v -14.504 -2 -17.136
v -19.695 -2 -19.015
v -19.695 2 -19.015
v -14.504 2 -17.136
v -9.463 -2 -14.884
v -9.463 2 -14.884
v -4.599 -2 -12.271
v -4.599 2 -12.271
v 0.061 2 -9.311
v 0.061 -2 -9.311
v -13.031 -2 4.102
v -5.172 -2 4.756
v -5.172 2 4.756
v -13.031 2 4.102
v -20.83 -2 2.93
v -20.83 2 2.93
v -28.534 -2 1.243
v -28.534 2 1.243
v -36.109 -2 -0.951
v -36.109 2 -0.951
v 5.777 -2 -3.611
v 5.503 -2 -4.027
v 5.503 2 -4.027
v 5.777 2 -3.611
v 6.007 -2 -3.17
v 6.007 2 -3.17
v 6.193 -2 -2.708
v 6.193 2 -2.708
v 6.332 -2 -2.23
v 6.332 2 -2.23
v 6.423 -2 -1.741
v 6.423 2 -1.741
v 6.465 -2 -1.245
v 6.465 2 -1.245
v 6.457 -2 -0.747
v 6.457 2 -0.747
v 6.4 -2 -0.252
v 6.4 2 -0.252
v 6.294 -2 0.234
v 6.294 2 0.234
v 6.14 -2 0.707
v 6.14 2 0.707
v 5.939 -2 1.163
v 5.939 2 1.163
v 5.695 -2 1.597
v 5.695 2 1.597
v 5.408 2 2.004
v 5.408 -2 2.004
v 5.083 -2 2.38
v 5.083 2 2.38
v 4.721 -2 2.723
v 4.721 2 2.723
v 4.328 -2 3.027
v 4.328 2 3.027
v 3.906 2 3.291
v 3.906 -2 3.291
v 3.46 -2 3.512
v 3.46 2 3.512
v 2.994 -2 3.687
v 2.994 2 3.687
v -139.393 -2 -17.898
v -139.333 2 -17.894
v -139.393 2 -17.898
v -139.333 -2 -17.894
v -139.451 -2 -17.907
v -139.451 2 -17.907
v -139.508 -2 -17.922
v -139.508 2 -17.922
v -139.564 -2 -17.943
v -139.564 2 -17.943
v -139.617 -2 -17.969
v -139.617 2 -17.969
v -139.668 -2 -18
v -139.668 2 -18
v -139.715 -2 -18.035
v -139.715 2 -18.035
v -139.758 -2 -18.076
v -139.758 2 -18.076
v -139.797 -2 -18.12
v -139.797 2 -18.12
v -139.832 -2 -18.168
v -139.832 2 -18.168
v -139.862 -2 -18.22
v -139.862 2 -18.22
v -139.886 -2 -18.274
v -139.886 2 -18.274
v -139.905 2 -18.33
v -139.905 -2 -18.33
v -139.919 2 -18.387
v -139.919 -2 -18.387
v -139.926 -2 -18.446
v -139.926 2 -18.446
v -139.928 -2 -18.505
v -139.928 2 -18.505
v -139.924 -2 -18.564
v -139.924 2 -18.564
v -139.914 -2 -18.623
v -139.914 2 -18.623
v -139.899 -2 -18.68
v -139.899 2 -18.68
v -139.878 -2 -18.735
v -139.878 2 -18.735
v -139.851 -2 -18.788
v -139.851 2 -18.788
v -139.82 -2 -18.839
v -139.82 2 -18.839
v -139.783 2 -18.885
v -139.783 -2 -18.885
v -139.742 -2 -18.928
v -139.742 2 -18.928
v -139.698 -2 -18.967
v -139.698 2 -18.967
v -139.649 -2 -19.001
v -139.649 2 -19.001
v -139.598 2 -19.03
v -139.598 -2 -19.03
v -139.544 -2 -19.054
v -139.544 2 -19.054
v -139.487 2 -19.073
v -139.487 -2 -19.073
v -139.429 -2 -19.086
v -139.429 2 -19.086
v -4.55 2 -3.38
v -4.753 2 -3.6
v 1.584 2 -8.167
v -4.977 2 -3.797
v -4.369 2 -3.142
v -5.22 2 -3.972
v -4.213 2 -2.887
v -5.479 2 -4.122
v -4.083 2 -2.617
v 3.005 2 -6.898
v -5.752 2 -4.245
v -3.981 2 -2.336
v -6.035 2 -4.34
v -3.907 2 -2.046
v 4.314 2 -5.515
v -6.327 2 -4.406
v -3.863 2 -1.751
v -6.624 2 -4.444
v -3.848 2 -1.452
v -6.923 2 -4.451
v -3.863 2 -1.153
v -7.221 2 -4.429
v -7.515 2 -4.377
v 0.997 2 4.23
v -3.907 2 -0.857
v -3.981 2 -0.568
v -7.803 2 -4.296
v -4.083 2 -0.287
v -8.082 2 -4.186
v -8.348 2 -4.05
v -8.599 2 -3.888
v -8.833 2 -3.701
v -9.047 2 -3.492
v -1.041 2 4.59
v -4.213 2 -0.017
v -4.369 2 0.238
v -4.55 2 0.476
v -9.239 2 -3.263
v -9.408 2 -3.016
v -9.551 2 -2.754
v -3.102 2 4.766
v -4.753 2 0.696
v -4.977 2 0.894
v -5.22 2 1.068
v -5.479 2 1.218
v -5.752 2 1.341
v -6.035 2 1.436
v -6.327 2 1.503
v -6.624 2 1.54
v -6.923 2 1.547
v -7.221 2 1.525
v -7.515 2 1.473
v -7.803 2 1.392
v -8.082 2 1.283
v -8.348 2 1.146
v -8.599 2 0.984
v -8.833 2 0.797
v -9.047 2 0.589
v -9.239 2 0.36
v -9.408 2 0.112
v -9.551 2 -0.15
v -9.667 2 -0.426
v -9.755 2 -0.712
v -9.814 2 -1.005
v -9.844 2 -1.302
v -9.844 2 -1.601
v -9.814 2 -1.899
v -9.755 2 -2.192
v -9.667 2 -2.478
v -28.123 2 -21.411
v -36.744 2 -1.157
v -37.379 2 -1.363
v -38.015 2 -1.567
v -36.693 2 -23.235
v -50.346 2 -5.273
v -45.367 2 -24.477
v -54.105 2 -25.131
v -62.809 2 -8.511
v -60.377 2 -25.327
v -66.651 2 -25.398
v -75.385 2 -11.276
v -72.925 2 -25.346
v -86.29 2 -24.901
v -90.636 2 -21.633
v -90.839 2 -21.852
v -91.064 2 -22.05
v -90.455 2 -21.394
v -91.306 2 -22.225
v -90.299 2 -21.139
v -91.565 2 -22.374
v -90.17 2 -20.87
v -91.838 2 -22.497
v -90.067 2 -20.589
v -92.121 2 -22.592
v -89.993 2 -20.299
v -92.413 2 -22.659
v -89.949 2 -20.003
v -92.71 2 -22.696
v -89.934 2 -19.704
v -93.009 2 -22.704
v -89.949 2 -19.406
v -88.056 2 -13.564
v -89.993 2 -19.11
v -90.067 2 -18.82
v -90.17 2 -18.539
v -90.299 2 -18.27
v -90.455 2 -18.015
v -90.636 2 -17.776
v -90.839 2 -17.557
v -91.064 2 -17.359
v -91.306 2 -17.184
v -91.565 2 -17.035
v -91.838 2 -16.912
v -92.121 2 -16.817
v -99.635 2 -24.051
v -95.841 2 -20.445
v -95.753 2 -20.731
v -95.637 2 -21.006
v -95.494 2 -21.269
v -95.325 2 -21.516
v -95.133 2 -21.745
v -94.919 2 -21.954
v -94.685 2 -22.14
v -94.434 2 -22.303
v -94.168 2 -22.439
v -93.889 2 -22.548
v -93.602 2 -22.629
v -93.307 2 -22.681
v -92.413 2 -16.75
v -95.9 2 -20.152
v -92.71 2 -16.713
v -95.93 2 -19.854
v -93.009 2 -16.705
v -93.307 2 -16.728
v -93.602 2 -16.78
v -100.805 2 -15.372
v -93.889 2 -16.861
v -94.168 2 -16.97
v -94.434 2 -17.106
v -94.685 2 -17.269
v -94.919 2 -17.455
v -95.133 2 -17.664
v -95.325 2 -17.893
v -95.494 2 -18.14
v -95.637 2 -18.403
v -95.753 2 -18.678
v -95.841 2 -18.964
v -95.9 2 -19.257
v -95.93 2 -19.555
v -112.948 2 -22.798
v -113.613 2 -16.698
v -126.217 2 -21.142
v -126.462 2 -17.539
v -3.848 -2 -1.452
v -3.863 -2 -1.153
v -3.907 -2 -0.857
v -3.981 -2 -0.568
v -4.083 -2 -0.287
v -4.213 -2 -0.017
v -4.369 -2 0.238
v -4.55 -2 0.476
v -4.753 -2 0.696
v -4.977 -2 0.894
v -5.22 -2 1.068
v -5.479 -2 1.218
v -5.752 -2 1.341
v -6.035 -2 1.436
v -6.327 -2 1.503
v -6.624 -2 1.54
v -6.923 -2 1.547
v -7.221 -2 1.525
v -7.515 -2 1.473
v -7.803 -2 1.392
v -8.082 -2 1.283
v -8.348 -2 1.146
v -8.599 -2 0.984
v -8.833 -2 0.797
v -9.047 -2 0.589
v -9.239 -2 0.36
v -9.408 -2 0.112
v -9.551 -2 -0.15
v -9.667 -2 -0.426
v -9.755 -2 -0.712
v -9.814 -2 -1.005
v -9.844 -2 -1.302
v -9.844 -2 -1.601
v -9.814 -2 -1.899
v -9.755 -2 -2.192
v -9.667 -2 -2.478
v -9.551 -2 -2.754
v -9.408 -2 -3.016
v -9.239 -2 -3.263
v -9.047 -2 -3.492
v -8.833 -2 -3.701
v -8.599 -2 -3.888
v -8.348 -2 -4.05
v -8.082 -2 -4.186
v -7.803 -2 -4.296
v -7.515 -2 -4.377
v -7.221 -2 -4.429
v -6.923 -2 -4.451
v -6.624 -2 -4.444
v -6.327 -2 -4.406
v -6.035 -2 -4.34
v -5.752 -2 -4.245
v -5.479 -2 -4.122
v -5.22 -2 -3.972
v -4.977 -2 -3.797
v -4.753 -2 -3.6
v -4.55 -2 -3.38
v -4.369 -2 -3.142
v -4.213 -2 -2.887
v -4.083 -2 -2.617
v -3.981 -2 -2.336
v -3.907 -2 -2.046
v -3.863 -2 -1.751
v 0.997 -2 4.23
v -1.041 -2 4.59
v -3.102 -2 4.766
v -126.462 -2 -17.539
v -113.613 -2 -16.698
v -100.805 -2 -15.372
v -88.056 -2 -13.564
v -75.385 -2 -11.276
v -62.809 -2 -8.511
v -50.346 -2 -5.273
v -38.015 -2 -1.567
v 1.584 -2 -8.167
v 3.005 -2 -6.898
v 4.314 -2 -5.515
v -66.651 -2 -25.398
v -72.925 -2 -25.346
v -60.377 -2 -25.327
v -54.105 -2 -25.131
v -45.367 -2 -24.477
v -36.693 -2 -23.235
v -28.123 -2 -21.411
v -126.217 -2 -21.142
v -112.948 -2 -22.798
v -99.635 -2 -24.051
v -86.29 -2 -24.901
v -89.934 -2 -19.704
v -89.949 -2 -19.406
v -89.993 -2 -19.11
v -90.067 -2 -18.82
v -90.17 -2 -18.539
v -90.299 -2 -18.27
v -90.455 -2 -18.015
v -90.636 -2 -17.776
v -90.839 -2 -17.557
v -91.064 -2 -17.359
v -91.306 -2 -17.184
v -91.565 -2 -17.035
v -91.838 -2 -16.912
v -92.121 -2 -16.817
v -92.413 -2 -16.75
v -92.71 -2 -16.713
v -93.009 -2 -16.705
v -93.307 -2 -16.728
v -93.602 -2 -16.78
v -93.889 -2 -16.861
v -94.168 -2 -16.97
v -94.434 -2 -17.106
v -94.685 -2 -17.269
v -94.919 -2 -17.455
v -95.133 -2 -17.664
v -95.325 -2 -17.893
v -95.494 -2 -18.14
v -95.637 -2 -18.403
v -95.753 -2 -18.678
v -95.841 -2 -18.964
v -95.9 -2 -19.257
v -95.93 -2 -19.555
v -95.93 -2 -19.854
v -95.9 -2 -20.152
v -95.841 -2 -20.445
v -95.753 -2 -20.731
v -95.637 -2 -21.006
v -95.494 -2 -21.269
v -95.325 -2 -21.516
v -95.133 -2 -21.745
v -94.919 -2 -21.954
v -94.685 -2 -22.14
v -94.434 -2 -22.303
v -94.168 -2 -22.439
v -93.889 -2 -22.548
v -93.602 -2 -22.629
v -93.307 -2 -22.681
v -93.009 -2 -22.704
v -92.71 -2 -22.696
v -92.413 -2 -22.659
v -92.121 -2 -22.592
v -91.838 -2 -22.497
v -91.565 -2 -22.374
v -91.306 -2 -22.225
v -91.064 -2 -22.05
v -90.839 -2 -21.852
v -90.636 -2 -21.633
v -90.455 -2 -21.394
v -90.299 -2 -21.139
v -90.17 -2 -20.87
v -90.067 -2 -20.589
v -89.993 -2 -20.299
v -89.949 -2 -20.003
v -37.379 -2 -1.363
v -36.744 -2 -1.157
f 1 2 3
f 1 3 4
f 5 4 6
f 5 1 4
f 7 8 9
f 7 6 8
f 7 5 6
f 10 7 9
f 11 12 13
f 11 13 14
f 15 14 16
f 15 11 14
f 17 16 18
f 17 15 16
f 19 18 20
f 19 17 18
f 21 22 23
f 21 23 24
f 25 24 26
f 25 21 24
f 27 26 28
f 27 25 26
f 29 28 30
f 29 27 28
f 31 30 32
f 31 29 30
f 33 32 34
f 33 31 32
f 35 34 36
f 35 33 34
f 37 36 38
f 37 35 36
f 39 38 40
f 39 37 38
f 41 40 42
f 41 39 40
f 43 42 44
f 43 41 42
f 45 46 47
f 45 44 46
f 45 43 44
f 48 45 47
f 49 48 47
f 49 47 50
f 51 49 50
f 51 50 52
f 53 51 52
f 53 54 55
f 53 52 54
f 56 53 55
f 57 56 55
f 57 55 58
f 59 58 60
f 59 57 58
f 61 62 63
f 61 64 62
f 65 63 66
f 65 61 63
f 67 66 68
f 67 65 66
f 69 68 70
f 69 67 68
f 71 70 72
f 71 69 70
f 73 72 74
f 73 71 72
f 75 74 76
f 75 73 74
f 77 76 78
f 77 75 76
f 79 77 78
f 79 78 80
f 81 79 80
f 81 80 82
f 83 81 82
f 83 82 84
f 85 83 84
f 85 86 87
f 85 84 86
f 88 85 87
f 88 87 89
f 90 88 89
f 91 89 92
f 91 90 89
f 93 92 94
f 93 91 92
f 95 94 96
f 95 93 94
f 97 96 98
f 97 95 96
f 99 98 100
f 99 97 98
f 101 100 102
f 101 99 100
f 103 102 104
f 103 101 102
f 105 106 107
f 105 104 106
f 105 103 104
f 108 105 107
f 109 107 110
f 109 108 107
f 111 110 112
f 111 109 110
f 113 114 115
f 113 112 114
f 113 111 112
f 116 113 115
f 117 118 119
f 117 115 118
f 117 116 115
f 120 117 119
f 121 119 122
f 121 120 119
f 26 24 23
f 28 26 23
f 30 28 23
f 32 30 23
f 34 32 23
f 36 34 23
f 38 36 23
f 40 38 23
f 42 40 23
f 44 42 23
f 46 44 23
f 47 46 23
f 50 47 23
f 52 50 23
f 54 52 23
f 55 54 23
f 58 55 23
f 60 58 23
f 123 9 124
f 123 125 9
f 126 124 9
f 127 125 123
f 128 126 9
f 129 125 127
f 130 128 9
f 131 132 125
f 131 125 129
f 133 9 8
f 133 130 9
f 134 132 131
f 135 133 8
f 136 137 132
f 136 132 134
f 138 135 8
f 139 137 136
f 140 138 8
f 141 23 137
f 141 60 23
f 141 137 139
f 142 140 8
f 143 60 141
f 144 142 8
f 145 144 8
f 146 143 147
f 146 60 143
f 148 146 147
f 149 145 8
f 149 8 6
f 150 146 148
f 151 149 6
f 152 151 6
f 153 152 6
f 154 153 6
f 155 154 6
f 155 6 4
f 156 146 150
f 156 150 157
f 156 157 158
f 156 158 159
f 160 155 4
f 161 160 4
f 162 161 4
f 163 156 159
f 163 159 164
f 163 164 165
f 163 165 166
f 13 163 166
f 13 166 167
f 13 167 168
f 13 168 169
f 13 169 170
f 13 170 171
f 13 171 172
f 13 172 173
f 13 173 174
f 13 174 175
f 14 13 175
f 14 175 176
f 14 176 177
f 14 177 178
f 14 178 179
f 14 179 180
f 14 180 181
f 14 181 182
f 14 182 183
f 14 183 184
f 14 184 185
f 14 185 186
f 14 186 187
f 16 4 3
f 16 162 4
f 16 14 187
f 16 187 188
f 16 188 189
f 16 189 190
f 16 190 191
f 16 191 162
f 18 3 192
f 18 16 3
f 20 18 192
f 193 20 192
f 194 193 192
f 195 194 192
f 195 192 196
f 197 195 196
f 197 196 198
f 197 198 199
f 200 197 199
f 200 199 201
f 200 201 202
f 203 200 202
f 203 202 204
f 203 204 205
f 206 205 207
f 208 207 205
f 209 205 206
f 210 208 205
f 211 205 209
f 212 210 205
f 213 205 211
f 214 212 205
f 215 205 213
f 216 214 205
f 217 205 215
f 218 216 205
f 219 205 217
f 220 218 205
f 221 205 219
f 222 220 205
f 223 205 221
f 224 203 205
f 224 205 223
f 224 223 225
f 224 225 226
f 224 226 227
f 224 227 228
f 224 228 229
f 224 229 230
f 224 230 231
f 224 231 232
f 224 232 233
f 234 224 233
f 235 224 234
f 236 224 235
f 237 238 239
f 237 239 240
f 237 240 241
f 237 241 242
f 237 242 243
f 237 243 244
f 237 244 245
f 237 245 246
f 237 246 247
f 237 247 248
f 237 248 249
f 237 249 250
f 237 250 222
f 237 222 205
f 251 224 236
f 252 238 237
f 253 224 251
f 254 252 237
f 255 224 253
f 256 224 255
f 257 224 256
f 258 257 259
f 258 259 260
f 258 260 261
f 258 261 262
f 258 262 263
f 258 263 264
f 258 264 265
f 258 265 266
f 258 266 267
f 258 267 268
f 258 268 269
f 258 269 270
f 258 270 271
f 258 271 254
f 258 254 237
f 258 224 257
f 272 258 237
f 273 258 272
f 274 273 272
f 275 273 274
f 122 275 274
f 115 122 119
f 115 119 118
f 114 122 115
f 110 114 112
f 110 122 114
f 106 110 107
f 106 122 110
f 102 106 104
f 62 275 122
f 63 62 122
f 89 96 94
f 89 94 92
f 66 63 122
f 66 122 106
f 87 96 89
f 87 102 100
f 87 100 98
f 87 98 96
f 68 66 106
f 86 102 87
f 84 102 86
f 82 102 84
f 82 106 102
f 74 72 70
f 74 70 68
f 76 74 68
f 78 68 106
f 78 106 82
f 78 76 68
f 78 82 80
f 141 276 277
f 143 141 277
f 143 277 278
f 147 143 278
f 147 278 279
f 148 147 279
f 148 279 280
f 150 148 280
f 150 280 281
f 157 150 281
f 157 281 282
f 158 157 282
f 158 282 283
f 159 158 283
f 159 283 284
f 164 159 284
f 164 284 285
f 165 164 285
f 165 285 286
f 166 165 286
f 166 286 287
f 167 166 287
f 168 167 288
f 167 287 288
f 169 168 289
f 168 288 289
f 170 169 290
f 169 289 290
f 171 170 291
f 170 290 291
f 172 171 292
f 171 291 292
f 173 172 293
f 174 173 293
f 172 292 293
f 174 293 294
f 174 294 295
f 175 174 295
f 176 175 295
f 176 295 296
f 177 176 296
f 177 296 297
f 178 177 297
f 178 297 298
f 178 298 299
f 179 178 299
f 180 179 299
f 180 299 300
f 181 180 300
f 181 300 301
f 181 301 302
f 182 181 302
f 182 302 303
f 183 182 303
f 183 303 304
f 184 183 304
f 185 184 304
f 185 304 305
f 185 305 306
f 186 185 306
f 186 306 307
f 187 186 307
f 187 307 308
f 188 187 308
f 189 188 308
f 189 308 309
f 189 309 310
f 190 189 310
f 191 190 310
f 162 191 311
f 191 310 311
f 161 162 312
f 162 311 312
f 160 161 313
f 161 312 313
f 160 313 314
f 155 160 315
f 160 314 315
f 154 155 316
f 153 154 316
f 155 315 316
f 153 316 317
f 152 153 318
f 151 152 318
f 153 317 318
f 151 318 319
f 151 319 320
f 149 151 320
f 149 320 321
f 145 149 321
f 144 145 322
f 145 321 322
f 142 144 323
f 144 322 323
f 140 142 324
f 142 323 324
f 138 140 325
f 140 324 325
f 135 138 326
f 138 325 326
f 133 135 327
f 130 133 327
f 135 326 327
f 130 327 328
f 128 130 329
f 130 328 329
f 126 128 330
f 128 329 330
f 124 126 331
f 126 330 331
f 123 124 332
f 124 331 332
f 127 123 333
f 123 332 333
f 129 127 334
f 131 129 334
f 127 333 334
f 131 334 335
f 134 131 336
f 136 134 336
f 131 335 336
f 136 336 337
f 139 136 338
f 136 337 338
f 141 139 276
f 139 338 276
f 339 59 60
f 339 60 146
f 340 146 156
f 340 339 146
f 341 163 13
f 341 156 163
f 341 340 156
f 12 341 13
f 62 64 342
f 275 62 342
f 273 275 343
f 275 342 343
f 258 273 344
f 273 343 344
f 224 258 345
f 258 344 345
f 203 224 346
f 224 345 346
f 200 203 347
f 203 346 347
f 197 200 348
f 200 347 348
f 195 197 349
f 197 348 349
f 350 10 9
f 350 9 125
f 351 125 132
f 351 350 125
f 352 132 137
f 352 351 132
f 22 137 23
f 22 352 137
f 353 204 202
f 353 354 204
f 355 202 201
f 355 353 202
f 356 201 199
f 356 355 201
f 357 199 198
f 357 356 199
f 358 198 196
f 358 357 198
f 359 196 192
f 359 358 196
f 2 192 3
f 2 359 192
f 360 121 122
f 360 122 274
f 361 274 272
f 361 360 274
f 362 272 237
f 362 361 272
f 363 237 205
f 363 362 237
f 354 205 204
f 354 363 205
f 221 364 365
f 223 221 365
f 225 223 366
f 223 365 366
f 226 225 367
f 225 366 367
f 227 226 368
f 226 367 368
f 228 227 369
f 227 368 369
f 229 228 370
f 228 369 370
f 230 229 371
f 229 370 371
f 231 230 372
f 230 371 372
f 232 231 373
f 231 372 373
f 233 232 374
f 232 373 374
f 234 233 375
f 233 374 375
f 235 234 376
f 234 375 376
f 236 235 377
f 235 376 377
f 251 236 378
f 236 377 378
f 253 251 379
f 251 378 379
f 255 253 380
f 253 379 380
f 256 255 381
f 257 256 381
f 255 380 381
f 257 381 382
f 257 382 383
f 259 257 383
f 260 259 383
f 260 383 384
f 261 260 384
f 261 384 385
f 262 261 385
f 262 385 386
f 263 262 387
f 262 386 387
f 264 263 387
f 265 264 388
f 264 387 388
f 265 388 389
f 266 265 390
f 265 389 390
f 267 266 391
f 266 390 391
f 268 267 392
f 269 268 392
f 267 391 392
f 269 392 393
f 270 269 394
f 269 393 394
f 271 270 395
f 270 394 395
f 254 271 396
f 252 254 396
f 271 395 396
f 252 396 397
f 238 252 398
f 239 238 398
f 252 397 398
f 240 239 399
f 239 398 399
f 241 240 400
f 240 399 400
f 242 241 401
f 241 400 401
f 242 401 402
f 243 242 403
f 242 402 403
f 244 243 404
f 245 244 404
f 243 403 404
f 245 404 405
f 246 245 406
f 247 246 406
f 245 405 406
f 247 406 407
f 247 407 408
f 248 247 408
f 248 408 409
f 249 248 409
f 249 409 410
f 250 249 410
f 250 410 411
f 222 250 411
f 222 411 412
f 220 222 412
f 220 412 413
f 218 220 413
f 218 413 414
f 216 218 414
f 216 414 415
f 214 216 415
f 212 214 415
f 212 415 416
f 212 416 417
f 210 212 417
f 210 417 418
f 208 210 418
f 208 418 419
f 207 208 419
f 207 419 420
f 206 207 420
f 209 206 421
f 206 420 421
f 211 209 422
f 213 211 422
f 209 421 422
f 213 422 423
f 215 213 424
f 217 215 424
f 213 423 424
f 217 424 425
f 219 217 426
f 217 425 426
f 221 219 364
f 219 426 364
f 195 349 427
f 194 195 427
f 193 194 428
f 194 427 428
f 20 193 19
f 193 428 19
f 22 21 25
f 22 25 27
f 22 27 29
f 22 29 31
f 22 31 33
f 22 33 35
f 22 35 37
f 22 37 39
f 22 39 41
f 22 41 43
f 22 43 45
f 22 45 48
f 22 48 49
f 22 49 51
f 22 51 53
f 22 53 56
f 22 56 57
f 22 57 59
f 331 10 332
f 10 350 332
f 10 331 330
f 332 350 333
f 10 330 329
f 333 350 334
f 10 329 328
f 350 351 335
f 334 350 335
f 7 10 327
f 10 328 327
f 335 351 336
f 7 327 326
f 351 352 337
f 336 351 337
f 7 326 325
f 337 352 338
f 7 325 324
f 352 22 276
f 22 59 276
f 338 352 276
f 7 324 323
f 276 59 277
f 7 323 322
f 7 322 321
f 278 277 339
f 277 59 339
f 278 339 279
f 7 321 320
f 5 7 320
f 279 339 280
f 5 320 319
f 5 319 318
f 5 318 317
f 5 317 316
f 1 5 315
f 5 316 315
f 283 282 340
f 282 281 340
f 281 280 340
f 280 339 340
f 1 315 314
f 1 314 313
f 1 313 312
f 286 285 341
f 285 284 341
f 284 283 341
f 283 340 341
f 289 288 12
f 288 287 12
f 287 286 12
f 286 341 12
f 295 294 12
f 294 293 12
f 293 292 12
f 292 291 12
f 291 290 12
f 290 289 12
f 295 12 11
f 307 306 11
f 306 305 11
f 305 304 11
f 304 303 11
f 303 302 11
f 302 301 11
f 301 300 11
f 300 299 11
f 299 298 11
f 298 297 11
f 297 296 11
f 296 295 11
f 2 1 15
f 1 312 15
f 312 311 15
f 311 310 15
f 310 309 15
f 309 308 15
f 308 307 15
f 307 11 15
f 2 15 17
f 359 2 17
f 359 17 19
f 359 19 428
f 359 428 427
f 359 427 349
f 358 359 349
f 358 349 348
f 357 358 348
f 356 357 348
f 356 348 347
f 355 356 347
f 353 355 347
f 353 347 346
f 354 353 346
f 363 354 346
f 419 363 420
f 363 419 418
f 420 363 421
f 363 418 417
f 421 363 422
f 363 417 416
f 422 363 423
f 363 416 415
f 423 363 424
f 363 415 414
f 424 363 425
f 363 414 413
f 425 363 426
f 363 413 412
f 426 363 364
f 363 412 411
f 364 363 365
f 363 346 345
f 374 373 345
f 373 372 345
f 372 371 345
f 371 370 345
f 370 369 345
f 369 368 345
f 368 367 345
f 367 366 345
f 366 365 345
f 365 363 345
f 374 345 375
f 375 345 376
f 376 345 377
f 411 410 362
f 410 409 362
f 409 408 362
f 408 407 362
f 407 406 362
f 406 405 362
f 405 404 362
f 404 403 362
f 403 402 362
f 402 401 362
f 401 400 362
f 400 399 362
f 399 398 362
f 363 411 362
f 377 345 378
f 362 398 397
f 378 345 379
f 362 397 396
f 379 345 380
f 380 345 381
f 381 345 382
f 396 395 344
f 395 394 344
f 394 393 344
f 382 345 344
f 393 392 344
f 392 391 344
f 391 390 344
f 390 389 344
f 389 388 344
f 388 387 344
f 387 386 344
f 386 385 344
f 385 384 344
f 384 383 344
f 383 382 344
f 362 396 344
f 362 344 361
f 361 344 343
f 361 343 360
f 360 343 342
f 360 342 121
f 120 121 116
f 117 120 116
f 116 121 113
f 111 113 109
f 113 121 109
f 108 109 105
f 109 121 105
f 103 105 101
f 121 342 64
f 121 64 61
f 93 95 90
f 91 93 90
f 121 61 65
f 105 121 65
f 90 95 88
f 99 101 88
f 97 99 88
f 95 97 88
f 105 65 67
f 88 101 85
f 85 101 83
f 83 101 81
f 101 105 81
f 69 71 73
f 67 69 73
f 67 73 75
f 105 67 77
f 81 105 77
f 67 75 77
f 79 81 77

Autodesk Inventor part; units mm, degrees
ref_plane "YZ Plane" through (0, 0, 0) normal (1, 0, 0) x (0, 1, 0)
ref_plane "XZ Plane" through (0, 0, 0) normal (0, 1, 0) x (-1, 0, 0)
ref_plane "XY Plane" through (0, 0, 0) normal (0, 0, 1) x (1, 0, 0)
sketch "スケッチ1" plane through (0, 0, 0) normal (0, 1, 0) x (-1, 0, 0)
  arc A0 (139.5982, -20.0714) -> (139.3421, -16.8944) centre (139.3282, -18.4944) ccw projected
  arc A1 (72.9436, -26.3461) -> (139.5982, -20.0714) centre (64.9013, 416.2515) ccw projected
  arc A2 (54.0641, -26.1303) -> (72.9436, -26.3461) centre (67.1484, 292.5868) ccw projected
  arc A3 (19.3892, -19.9666) -> (54.0641, -26.1303) centre (59.4352, 104.7024) ccw projected
  arc A4 (-0.6275, -10.135) -> (19.3892, -19.9666) centre (42.8692, 53.13) ccw projected
  arc A5 (-6.31, -4.6171) -> (-0.6275, -10.135) centre (12.76, 9.3368) ccw projected
  arc A6 (-3.299, 4.6397) -> (-6.31, -4.6171) centre (-1.4678, -1.074) ccw projected
  arc A7 (5.2215, 5.7549) -> (-3.299, 4.6397) centre (4.0256, -18.2153) ccw projected
  arc A8 (36.4188, 0) -> (5.2215, 5.7549) centre (-0.7578, -114.096) ccw projected
  arc A9 (36.4188, 0) -> (38.3204, -0.6152) centre (185.125, 456.3841) ccw projected
  arc A10 (38.3204, -0.6152) -> (139.3421, -16.8944) centre (142.307, 323.0926) ccw projected
  point P0 (0, 0)
extrude "押し出し1" add sketch "スケッチ1" along normal mid plane 4
sketch "スケッチ2" plane through (0, -2, 0) normal (0, -1, 0) x (1, 0, 0)
  circle A0 centre (-6.8478, -1.4519) radius 3
  circle A1 centre (-92.934, -19.7045) radius 3
  line L0 (0, 0) -> (-112.4991, -23.8528)
  arc A2 (-139.5982, -20.0714) -> (-72.9436, -26.3461) centre (-64.9013, 416.2515) ccw projected
  dimension "d3" = 6
  dimension "d4" = 6
  dimension "d5" = 115
  dimension "d6" = 7
  dimension "d7" = 95
extrude "押し出し2" cut sketch "スケッチ2" against normal through all
thicken "厚み1" operation cut thickness 1 both sides no extend neighbours no toward (0.0338891, 0, -0.9994256) faces at (-130.7847, 0.6667, -16.7121) (-37.4749, 0.6667, -0.3428) (-8.7492, -0.6667, 5.5268) (2.3792, -0.6667, 4.9143) (6.574, -0.6667, -4.2247) (1.3466, -0.6667, -9.6205) (-17.0344, -0.6667, -19.1679) (-50.1454, -0.6667, -25.9105) (-56.1608, 0.6667, -26.2095) (-102.6817, 0.6667, -24.804) (-139.7269, 0.6667, -20.0439)
properties part number "flap_s" material "木材 (オーク)"
